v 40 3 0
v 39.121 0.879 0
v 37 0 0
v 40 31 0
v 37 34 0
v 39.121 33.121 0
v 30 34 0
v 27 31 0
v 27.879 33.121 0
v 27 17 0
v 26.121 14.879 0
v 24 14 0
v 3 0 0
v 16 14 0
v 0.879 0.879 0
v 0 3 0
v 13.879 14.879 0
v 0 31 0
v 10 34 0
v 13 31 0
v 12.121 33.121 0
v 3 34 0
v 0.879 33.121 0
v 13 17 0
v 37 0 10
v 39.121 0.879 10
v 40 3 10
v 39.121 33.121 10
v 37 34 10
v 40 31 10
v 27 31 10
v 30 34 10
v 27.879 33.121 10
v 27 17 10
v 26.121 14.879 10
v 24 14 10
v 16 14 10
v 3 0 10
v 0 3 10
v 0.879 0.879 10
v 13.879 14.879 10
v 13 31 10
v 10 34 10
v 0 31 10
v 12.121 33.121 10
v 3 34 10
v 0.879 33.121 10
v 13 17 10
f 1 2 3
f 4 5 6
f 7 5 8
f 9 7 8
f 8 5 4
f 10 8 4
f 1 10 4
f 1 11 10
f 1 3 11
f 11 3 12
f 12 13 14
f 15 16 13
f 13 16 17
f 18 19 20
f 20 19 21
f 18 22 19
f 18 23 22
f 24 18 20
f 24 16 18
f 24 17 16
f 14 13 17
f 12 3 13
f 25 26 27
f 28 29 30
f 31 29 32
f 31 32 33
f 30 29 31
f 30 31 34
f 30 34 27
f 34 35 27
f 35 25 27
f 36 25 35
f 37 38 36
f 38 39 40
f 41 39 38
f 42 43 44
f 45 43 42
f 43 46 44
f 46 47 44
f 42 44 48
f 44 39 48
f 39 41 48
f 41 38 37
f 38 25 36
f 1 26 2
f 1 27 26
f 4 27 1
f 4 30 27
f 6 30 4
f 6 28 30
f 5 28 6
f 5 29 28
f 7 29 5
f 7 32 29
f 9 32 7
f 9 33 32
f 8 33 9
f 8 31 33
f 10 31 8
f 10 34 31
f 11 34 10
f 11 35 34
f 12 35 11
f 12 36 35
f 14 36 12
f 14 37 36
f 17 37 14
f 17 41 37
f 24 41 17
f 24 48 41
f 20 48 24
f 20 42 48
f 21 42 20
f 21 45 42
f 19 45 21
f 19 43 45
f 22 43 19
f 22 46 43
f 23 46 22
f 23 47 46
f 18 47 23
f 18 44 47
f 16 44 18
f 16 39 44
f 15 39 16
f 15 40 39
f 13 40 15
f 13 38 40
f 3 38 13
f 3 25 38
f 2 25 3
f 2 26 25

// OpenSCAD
$fn = 32;

// ----------------------------------------------------------------------
// Eye lug: clevis, 10 mm thick
// ----------------------------------------------------------------------

// --- parameters (mm) ---
profile_height = 10;      // extrusion height
profile_points = 24;      // points of the closed outline

profile = [[0, 3], [0.879, 0.879], [3, 0], [37, 0], [39.121, 0.879], [40, 3], [40, 31], [39.121, 33.121], [37, 34], [30, 34], [27.879, 33.121], [27, 31], [27, 17], [26.121, 14.879], [24, 14], [16, 14], [13.879, 14.879], [13, 17], [13, 31], [12.121, 33.121], [10, 34], [3, 34], [0.879, 33.121], [0, 31]];  // single closed polygon, 24 points, counter clockwise

// --- the one profile operation ---
linear_extrude(height = profile_height) polygon(points = profile);
